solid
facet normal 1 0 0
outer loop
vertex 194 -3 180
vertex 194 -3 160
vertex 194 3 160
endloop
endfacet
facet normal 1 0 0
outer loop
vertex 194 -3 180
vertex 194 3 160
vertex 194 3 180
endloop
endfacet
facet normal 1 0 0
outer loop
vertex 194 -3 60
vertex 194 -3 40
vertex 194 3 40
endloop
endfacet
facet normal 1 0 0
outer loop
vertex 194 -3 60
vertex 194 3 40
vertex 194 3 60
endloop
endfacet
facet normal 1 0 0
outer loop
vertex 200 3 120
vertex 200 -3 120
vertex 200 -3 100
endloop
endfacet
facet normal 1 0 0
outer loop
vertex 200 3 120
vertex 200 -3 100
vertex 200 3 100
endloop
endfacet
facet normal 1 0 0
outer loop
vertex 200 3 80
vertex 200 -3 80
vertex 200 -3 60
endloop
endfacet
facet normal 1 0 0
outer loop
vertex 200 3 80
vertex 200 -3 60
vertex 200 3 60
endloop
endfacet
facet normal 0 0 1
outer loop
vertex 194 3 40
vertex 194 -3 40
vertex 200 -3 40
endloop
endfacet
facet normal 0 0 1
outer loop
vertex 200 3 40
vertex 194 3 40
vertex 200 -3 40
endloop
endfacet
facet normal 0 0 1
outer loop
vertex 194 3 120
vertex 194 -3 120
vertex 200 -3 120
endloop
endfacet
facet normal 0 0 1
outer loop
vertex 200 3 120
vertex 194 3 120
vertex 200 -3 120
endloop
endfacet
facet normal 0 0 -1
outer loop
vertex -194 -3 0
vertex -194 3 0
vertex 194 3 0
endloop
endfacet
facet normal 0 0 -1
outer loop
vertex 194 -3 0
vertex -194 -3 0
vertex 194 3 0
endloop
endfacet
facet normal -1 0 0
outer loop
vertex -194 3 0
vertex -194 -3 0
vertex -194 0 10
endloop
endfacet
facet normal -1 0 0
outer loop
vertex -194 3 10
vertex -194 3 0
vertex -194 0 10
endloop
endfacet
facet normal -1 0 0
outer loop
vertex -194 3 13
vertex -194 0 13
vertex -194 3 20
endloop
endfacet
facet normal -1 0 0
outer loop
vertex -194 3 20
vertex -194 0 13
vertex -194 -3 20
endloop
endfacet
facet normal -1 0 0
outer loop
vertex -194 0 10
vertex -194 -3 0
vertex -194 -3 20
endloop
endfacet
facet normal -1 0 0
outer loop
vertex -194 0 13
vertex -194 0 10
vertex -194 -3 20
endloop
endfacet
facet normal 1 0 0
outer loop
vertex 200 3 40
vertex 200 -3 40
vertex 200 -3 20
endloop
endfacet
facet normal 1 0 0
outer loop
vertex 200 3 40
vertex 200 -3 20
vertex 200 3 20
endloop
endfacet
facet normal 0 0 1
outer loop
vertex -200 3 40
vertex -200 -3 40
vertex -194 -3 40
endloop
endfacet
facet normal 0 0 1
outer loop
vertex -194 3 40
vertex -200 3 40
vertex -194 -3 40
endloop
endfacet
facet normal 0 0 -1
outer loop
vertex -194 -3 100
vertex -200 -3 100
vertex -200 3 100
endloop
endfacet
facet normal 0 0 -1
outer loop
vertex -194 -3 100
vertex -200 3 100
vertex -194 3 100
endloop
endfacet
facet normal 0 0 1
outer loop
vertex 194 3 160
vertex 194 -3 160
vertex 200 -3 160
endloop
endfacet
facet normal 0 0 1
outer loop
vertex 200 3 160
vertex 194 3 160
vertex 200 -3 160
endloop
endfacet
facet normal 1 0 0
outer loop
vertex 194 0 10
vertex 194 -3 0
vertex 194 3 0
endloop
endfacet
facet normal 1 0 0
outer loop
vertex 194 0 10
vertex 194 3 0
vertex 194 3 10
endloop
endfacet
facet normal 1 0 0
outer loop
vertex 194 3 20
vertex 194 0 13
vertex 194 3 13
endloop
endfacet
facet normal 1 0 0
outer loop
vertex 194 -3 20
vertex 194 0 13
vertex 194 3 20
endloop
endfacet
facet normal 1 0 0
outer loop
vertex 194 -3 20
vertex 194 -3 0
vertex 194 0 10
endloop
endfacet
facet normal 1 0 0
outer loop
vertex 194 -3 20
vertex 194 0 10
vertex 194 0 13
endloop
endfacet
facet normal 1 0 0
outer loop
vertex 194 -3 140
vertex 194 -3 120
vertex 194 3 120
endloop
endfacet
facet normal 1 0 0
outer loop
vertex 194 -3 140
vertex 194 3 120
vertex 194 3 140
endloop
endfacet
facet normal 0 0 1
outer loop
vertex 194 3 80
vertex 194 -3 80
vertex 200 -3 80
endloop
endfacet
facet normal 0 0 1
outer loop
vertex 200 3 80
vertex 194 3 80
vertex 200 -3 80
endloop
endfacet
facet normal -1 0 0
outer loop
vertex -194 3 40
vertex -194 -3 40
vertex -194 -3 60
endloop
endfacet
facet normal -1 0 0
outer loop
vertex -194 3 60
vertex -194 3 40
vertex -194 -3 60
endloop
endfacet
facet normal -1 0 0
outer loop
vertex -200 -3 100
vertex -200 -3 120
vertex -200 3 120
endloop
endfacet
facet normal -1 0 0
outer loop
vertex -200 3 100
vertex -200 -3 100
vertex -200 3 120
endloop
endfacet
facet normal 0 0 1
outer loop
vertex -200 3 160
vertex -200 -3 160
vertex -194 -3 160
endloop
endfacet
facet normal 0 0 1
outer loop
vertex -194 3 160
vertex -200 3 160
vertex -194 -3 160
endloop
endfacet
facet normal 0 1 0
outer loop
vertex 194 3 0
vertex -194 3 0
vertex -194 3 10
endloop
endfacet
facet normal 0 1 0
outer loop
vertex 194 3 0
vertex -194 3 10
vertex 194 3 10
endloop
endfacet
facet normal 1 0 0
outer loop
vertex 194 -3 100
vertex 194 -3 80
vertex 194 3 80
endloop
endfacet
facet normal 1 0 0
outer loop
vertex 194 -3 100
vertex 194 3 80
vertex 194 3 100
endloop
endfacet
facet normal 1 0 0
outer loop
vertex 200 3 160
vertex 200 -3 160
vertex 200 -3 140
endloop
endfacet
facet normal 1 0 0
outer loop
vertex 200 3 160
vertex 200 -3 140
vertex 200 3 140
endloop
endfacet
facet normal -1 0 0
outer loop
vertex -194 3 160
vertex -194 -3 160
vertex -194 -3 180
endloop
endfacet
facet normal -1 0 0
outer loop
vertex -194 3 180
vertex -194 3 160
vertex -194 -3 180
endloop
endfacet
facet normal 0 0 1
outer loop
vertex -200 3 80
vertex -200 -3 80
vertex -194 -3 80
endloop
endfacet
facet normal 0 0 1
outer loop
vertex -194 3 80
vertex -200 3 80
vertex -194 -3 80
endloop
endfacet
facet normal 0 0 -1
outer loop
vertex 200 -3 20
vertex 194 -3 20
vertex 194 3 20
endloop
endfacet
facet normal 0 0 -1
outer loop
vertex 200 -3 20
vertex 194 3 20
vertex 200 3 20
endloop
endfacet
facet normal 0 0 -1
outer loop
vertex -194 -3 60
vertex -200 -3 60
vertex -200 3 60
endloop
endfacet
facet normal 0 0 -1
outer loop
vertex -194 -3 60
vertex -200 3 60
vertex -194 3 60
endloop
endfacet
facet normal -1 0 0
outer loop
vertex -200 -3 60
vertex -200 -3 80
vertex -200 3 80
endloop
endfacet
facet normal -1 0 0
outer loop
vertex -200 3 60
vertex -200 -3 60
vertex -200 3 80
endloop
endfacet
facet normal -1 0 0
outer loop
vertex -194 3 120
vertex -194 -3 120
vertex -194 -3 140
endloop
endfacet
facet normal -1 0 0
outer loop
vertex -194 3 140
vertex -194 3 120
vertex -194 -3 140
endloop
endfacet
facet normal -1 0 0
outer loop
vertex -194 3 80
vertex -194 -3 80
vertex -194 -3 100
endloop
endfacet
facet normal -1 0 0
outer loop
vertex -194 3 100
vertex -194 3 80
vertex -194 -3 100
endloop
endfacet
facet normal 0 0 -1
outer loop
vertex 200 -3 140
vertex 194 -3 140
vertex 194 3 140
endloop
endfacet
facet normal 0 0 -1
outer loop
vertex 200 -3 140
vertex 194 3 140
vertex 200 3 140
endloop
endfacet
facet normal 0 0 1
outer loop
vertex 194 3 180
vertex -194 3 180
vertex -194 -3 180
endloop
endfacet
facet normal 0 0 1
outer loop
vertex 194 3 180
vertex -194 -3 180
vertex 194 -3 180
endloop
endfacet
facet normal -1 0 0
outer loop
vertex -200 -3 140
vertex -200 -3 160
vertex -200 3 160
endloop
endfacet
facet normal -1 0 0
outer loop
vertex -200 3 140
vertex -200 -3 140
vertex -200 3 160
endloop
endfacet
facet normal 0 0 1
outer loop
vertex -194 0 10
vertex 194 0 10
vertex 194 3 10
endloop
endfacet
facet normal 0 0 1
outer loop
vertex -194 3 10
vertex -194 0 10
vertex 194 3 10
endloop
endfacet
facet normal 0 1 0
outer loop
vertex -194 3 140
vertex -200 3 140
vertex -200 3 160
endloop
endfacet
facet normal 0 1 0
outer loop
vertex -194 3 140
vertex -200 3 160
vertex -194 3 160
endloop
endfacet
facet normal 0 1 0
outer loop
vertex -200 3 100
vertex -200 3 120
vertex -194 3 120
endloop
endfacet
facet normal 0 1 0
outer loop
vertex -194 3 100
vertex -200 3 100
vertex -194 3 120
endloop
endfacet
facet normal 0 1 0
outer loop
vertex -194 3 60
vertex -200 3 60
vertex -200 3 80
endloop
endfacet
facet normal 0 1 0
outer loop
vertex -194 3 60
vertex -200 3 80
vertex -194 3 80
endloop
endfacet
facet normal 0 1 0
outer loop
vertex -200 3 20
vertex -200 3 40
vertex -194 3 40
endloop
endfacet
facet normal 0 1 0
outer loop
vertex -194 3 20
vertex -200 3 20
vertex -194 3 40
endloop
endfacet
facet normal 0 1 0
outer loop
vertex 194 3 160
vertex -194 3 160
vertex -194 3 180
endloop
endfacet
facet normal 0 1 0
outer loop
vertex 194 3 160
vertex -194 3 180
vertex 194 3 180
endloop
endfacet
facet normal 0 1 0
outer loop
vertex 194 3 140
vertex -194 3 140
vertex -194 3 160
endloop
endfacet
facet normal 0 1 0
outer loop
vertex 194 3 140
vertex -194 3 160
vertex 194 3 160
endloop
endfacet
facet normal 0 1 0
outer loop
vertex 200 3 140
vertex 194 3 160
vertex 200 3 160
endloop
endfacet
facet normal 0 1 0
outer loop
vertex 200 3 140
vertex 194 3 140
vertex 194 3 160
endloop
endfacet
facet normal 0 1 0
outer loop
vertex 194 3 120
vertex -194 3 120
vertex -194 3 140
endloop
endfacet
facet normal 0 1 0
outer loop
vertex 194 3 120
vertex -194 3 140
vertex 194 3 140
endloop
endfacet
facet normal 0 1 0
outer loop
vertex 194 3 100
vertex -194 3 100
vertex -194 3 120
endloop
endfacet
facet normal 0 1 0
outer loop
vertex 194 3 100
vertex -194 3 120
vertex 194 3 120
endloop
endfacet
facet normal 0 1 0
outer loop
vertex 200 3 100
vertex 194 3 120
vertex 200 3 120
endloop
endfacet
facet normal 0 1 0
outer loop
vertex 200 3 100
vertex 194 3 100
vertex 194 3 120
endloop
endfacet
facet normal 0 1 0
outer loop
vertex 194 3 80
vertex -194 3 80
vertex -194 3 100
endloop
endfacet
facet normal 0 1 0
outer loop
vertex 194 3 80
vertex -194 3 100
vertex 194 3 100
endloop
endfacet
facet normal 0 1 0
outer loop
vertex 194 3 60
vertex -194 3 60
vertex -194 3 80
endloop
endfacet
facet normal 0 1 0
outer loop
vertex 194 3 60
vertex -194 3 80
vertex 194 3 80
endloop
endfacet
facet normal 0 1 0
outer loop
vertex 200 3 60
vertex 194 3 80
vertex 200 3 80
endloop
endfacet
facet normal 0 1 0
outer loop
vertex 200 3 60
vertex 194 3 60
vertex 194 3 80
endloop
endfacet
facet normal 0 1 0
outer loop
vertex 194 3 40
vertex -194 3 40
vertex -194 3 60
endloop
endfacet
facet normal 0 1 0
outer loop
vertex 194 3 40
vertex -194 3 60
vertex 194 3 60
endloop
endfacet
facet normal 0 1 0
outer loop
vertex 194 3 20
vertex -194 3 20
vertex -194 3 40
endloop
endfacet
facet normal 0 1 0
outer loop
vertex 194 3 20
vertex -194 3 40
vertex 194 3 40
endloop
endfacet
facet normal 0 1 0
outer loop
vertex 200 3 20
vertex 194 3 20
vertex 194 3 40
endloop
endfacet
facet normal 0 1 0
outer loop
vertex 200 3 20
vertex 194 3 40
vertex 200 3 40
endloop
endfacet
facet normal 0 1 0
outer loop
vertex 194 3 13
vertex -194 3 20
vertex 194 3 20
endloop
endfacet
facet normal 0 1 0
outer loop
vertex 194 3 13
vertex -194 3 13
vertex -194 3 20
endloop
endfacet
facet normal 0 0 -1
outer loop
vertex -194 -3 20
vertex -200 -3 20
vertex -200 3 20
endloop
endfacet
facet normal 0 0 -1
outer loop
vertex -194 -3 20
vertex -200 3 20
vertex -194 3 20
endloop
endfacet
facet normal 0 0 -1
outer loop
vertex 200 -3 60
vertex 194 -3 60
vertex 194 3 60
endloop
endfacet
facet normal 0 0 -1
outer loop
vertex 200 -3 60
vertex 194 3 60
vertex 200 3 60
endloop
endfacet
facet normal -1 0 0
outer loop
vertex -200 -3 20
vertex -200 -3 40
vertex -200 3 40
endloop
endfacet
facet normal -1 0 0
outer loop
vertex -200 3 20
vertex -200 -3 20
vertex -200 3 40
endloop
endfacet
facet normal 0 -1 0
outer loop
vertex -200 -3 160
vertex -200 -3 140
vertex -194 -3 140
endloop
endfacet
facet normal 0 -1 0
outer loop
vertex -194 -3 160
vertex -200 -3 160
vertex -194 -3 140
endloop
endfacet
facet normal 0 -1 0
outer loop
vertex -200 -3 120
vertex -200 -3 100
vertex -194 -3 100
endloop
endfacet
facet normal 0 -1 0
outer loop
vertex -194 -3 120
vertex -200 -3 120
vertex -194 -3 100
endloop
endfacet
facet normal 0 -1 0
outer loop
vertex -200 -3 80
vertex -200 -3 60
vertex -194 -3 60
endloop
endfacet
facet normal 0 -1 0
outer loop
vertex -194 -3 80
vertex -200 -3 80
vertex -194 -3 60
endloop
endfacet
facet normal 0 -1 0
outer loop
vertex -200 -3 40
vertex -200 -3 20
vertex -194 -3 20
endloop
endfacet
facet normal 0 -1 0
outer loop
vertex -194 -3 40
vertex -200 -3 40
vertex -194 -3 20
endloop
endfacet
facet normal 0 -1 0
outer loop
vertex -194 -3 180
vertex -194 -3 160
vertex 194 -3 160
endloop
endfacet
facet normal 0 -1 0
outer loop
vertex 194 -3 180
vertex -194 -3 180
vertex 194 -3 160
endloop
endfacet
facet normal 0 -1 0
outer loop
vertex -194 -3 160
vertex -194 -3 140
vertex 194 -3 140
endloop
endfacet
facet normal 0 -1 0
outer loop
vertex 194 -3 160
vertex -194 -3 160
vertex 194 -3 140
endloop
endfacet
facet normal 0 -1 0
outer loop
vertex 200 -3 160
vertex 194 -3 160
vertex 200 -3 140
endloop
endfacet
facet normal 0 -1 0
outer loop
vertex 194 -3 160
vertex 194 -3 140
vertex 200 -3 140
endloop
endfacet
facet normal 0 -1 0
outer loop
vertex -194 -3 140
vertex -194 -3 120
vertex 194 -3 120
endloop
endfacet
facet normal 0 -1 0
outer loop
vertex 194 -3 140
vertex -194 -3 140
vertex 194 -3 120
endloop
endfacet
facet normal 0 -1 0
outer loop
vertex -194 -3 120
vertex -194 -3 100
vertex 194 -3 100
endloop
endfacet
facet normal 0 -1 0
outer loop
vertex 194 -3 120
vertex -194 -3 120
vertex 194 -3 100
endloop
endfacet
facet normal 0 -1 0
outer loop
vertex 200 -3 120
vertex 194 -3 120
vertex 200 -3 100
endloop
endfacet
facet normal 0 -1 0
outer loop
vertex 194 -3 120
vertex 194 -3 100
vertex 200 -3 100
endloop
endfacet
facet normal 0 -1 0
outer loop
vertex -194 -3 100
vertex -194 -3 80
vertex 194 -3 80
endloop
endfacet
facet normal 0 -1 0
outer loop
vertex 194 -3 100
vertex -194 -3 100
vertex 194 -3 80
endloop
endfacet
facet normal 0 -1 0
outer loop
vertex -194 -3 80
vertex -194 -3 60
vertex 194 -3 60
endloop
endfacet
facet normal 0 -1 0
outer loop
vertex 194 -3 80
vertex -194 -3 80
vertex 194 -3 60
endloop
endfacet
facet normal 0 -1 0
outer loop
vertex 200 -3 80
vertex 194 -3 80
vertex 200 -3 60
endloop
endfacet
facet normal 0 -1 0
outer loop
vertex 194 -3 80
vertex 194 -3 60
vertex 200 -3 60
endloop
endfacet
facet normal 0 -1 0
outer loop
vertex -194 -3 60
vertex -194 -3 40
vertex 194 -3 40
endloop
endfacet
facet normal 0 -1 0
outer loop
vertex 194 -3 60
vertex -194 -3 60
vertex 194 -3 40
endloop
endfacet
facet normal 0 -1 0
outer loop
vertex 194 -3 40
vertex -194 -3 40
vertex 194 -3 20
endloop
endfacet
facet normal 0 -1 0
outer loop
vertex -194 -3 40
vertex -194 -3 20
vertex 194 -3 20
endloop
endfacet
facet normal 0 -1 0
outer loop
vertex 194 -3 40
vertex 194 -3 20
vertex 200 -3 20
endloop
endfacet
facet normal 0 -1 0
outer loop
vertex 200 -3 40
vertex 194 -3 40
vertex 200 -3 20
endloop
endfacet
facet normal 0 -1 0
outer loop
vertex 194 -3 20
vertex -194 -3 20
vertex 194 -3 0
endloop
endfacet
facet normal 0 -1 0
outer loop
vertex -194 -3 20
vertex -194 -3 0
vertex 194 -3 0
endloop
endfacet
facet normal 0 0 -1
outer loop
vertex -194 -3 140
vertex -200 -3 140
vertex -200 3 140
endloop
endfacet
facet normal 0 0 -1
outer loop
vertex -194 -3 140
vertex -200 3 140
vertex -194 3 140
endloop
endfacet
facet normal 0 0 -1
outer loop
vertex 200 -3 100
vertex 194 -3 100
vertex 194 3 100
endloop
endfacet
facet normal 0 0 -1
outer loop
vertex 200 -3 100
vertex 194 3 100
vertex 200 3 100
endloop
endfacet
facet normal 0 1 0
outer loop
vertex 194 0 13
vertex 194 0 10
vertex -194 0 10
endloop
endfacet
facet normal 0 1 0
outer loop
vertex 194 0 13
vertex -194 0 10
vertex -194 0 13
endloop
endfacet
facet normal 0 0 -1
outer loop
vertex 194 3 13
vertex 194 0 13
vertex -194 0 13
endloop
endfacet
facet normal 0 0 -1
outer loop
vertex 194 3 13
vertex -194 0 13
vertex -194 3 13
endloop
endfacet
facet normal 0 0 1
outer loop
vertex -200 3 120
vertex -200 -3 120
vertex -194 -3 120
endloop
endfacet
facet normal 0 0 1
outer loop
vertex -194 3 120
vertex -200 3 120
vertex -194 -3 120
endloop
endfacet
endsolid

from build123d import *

# Parameters (mm, degrees)
F0_W     = 400
F0_H     = 6
F1_DEPTH = 180
F2_W     = 3
F2_H     = 3
F3_DEPTH = 400.001
F4_W     = 6
F4_H     = 20
F5_DEPTH = 6.001


with BuildPart() as f1:
    # F0 (on Top) → F1 (new body)
    with BuildSketch(Plane.XY):
        Rectangle(F0_W, F0_H)
    extrude(amount=F1_DEPTH)

    # F2 (on face) → F3 (cut, through all)
    with BuildSketch(Plane.YZ.offset(200)):
        with Locations((1.5, 11.5)):
            Rectangle(F2_W, F2_H)
    extrude(amount=-F3_DEPTH, mode=Mode.SUBTRACT)

    # F4 (on face) → F5 (cut, through all)
    with BuildSketch(Plane.XZ.offset(3)):
        with Locations((-197, 170)):
            Rectangle(F4_W, F4_H)
        with Locations((-197, 130)):
            Rectangle(F4_W, F4_H)
        with Locations((-197, 90)):
            Rectangle(F4_W, F4_H)
        with Locations((-197, 50)):
            Rectangle(F4_W, F4_H)
        with Locations((-197, 10)):
            Rectangle(F4_W, F4_H)
        with Locations((197, 10)):
            Rectangle(F4_W, F4_H)
        with Locations((197, 50)):
            Rectangle(F4_W, F4_H)
        with Locations((197, 90)):
            Rectangle(F4_W, F4_H)
        with Locations((197, 130)):
            Rectangle(F4_W, F4_H)
        with Locations((197, 170)):
            Rectangle(F4_W, F4_H)
    extrude(amount=-F5_DEPTH, mode=Mode.SUBTRACT)


solid = f1.part
